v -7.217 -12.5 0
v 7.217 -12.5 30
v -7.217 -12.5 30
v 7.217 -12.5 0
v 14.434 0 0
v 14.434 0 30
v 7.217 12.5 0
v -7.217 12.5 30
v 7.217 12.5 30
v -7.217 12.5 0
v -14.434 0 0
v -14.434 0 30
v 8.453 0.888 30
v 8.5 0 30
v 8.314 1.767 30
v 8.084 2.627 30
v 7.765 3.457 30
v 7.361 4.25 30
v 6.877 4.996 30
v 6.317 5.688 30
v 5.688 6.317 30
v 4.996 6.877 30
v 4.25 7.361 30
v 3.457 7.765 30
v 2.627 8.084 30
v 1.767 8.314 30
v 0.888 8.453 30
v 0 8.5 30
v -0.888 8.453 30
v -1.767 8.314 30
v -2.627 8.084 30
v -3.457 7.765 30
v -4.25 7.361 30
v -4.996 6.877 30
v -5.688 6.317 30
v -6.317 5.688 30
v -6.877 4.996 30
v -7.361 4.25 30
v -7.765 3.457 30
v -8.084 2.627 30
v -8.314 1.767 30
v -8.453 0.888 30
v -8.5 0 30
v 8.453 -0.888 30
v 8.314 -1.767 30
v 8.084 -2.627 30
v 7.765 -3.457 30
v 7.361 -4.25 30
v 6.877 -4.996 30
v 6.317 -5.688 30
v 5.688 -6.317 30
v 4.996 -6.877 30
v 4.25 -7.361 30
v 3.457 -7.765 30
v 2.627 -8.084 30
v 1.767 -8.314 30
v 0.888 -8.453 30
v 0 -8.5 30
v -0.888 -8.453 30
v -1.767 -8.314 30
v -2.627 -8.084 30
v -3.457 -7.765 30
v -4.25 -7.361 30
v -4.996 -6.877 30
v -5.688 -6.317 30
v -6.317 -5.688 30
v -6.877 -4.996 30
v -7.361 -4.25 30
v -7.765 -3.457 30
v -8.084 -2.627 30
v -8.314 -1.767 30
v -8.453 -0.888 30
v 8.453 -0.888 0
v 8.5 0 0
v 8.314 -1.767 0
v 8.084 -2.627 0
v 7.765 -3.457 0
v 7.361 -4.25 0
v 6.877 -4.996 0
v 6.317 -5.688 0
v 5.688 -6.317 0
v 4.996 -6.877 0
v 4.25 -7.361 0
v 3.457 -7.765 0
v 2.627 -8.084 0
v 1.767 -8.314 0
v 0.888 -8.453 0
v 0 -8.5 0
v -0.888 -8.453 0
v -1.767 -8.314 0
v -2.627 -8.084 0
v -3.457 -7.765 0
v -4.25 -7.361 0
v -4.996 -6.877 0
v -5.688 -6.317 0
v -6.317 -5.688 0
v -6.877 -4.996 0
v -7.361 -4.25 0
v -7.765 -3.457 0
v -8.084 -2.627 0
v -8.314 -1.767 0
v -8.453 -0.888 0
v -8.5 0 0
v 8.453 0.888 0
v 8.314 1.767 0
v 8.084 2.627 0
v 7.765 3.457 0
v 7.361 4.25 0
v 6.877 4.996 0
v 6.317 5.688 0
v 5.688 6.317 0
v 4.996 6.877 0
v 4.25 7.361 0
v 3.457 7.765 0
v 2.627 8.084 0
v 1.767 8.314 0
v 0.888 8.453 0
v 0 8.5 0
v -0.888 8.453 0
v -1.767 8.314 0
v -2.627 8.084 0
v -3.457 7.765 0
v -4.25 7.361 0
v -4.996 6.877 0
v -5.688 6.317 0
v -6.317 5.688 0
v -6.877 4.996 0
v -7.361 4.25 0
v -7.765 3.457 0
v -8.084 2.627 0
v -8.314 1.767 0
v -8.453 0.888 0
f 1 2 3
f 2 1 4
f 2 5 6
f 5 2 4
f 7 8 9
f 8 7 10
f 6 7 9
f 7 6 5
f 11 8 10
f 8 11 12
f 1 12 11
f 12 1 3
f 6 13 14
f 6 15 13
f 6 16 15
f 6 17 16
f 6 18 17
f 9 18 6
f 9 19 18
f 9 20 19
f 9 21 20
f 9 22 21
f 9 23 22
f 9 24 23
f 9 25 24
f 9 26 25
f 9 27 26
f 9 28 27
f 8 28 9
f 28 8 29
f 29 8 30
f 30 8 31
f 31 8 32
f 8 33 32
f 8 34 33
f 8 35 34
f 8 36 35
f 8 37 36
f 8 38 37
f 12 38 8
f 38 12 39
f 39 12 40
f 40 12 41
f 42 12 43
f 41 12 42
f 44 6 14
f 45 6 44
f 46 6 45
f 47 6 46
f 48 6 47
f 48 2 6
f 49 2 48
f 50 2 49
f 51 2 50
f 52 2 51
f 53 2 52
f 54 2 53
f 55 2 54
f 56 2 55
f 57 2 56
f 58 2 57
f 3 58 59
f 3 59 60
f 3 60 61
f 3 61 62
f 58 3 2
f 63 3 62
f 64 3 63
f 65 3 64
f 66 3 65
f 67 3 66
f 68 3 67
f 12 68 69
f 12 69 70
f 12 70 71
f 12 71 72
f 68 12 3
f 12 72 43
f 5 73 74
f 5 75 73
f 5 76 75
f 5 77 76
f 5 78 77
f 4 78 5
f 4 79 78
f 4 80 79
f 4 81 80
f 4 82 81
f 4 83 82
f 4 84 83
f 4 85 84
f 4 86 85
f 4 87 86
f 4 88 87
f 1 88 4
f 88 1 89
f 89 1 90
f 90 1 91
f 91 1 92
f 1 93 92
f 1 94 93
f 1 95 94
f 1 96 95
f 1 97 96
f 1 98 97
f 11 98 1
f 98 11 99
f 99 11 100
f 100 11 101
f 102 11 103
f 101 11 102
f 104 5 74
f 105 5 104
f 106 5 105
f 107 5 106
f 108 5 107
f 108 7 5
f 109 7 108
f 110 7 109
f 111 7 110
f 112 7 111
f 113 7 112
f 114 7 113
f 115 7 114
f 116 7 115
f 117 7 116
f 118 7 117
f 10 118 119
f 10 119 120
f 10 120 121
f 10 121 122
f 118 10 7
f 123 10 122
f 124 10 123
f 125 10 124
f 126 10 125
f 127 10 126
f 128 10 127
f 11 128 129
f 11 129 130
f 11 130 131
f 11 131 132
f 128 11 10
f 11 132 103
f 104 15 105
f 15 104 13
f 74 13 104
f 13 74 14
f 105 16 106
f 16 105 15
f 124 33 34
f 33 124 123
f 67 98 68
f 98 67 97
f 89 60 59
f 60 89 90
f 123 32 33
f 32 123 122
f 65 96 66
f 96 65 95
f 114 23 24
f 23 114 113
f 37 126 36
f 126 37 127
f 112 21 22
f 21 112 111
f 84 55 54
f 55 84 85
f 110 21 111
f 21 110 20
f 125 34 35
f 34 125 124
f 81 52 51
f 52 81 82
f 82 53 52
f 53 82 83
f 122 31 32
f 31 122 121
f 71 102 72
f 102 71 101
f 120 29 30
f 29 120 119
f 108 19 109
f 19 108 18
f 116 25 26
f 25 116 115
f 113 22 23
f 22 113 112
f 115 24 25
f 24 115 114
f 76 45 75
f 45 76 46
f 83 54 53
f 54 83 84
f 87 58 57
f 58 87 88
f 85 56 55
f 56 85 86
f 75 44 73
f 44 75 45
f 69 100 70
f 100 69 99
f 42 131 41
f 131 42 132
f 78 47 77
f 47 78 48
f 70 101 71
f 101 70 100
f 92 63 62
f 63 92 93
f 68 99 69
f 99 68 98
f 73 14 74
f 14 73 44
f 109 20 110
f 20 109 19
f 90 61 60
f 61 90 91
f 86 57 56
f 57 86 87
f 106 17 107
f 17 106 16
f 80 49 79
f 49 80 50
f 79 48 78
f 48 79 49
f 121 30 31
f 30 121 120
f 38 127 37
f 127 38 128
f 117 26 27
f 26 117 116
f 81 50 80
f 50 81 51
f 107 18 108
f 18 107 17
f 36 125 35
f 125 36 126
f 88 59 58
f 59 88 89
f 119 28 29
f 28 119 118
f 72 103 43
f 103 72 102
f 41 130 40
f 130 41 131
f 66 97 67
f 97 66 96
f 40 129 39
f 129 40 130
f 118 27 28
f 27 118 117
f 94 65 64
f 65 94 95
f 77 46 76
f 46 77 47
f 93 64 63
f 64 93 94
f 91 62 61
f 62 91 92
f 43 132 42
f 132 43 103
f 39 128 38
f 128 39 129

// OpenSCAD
// Hex spacer.
$fn = 60;
eps = 0.02;
inner_d = 17;
flat = 25;
length = 30;
difference() { cylinder(d=flat/cos(30),h=length,$fn=6); translate([0,0,-eps]) cylinder(d=inner_d,h=length+2*eps); }
